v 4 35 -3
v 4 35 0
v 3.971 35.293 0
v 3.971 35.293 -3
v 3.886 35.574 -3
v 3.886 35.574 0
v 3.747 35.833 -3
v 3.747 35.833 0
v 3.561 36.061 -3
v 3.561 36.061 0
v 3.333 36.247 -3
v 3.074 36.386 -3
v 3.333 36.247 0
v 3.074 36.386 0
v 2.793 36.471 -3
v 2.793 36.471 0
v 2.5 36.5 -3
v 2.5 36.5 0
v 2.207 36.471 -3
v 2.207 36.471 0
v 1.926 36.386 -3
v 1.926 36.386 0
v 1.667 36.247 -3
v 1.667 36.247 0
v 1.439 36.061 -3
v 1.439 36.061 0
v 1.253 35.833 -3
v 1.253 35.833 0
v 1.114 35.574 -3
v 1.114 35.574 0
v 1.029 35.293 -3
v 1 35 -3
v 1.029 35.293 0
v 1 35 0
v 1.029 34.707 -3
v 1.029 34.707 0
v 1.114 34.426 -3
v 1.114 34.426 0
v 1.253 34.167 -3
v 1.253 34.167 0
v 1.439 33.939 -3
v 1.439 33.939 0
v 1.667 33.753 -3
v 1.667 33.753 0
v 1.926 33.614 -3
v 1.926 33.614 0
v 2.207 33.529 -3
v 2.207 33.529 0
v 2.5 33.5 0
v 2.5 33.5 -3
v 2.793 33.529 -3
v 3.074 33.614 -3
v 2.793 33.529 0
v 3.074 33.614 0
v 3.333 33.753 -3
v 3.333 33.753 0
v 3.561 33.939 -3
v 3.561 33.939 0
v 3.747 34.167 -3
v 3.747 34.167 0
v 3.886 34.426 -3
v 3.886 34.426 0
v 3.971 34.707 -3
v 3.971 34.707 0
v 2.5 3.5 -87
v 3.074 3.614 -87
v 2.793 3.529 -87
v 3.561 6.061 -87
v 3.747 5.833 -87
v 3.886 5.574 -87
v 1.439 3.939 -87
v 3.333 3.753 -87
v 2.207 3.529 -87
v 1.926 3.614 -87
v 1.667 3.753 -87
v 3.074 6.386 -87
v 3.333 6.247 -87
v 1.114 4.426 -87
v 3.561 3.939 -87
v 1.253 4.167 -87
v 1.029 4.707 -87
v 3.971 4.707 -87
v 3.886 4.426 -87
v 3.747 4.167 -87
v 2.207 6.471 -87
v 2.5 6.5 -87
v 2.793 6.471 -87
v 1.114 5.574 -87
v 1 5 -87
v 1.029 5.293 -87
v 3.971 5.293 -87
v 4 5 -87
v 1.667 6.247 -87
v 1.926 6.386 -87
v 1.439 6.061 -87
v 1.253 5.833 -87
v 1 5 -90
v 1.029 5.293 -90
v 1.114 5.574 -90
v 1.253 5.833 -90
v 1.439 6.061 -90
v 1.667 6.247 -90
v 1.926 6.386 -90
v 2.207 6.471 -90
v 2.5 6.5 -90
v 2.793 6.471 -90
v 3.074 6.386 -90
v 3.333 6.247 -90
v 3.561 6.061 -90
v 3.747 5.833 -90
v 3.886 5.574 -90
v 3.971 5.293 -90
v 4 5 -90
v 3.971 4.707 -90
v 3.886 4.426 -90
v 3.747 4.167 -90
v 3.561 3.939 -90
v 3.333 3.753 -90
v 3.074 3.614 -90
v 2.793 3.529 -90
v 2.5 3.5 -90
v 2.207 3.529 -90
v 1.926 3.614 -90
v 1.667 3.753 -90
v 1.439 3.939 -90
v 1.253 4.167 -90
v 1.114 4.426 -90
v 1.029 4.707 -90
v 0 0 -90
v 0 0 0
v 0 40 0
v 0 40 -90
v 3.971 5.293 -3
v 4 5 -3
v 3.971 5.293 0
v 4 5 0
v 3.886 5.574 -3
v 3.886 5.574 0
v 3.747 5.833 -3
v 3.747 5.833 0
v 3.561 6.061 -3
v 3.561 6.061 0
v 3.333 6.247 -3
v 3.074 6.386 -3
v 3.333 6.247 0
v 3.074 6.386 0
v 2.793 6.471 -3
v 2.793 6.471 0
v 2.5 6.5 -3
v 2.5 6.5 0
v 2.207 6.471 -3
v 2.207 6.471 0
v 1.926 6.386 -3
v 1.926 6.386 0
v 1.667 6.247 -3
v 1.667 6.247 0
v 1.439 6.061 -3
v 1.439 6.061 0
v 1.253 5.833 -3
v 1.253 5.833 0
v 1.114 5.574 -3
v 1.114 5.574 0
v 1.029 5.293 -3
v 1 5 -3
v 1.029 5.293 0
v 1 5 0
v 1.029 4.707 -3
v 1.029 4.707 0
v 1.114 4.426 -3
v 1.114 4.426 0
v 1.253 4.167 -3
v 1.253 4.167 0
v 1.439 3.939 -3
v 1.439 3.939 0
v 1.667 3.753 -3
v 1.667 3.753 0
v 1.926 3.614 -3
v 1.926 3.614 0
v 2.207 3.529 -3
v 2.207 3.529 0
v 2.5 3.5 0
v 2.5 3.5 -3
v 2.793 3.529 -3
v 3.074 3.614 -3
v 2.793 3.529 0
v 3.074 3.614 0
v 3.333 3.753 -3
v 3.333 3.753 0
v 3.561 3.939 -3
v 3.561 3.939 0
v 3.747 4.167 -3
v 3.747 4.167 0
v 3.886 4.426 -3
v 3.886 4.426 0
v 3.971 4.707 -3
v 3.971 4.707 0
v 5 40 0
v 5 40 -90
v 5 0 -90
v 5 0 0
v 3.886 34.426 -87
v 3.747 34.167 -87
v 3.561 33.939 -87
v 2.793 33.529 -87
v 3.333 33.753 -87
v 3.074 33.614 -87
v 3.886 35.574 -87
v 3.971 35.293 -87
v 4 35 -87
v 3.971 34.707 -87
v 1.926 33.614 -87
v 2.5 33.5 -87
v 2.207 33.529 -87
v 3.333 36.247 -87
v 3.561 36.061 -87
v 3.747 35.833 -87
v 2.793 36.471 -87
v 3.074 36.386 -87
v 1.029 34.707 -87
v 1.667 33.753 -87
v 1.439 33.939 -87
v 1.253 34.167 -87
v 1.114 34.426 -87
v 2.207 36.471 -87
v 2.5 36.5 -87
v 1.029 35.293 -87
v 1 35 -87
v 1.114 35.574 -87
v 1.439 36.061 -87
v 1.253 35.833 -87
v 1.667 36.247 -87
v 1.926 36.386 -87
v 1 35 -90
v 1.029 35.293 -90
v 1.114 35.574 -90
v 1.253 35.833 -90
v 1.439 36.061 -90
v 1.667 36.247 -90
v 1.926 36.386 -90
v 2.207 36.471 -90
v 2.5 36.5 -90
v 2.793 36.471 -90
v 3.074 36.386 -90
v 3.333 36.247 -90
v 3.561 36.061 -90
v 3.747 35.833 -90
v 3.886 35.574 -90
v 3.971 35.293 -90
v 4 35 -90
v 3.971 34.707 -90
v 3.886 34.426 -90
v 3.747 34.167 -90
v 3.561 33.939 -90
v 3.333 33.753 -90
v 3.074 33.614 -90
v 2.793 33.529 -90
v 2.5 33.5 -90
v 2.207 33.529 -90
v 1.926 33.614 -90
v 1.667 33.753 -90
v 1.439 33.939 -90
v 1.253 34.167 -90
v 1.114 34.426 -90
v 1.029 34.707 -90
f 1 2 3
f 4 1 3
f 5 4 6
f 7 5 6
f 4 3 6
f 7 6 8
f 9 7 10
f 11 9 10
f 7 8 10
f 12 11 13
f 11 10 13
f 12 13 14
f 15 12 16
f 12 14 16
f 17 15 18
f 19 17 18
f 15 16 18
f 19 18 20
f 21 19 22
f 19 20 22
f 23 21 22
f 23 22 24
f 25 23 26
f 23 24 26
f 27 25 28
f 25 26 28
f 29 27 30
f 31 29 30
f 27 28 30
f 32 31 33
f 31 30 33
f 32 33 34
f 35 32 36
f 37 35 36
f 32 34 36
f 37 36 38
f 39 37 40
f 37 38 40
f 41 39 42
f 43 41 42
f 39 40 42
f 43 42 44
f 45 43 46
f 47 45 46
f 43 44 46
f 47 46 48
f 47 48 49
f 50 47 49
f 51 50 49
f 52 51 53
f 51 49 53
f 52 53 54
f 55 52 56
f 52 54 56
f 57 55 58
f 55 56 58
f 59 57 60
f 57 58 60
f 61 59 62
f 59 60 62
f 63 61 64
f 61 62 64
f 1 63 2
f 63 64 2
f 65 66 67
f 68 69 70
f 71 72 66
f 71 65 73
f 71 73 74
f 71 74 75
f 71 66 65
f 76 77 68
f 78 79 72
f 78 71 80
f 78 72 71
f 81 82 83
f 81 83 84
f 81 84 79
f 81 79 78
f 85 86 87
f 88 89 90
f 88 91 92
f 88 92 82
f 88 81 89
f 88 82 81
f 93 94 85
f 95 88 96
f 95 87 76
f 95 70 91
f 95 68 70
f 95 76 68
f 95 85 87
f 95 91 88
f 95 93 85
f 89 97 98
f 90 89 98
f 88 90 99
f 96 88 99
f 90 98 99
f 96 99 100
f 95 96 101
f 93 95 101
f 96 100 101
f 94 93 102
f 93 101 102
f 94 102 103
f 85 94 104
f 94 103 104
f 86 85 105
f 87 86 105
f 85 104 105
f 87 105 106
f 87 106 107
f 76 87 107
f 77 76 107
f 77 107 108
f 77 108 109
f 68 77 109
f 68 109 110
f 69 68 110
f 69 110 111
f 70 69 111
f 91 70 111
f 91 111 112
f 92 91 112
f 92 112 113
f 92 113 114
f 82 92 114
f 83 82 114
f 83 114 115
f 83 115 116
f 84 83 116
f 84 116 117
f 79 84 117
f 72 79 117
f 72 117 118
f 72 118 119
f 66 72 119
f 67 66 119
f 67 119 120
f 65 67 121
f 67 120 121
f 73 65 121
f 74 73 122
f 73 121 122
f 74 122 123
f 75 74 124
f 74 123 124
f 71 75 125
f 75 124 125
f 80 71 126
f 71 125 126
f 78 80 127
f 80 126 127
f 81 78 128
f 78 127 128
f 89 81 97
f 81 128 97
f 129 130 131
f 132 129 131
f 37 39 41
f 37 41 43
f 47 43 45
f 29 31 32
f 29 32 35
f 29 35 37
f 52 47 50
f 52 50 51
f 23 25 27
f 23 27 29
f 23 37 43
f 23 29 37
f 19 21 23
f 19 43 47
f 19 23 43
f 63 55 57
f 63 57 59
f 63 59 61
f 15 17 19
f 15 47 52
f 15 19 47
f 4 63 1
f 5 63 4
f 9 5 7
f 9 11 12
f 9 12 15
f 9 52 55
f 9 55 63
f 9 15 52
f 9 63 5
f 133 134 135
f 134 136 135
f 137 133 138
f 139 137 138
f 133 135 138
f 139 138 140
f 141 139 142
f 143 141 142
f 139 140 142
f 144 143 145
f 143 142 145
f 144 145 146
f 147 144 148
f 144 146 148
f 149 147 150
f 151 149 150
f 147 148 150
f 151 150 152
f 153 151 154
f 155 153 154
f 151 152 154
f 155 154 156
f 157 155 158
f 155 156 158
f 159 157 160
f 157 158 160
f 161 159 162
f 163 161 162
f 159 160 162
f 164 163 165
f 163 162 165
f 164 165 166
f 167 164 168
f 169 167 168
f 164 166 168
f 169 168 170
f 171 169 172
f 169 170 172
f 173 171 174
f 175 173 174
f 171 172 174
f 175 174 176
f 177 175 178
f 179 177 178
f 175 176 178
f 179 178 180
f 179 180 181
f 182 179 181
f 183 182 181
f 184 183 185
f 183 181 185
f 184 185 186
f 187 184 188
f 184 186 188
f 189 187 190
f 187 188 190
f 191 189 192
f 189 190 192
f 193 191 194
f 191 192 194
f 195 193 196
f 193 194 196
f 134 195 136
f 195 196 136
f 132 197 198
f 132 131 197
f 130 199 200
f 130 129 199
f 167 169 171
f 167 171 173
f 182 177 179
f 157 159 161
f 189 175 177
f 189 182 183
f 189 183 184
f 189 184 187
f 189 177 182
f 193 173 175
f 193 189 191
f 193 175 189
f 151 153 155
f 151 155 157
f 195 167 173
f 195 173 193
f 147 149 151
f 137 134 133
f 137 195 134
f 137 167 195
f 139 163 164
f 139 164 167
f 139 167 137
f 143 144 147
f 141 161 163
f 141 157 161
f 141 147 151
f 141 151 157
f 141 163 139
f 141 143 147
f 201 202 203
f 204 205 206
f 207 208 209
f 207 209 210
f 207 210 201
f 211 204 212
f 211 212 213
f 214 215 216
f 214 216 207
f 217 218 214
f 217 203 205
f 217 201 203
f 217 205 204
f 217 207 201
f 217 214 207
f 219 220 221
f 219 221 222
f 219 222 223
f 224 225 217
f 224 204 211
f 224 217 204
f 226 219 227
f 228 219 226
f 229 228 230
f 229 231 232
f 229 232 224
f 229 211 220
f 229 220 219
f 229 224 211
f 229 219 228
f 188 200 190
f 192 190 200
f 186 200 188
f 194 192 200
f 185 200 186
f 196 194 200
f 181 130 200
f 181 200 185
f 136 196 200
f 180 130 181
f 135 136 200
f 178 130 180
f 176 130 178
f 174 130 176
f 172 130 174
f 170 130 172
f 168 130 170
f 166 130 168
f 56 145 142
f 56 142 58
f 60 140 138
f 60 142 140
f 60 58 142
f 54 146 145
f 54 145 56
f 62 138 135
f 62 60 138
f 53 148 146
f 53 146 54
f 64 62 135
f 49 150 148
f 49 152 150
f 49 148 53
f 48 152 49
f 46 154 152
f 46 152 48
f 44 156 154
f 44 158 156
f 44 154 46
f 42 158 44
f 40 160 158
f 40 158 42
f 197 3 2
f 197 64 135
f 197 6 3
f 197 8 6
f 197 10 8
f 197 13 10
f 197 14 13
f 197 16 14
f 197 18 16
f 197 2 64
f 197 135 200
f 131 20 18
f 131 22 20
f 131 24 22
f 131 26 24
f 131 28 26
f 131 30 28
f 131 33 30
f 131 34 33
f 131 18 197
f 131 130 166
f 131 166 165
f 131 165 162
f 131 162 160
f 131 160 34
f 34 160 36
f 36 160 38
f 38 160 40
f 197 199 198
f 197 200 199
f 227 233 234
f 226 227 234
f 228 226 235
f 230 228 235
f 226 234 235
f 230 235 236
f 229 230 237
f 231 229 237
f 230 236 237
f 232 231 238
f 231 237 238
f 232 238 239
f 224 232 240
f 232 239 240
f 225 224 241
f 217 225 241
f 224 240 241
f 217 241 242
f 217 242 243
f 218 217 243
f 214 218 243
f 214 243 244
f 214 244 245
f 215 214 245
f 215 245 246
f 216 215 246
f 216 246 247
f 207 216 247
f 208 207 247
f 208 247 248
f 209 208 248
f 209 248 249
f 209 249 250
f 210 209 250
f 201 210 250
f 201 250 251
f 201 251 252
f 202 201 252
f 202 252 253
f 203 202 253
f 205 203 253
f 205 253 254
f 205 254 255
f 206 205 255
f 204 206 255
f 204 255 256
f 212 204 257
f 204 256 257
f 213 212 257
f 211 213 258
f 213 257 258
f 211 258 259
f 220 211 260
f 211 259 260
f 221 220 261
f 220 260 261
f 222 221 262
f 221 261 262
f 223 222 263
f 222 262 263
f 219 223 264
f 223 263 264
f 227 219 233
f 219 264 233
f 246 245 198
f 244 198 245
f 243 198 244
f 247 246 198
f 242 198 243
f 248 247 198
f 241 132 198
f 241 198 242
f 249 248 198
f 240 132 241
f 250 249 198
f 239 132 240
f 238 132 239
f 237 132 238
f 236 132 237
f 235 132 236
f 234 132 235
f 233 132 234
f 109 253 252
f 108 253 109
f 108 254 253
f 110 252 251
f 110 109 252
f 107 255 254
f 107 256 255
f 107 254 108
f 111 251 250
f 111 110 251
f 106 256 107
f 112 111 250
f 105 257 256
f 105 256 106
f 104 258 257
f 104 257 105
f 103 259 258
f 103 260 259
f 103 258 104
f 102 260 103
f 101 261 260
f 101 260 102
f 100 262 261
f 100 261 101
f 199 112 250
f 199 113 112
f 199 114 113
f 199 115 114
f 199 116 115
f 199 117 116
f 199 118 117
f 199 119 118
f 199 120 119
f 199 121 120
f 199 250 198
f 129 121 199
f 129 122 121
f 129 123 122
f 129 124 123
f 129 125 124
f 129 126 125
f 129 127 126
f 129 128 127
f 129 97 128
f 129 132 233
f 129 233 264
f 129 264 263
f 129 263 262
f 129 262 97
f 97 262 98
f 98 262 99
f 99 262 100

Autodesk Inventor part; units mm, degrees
ref_plane "YZ Plane" through (0, 0, 0) normal (1, 0, 0) x (0, 1, 0)
ref_plane "XZ Plane" through (0, 0, 0) normal (0, 1, 0) x (-1, 0, 0)
ref_plane "XY Plane" through (0, 0, 0) normal (0, 0, 1) x (1, 0, 0)
sketch "Boceto1" plane through (0, 0, 0) normal (1, 0, 0) x (0, 1, 0)
  line L0 (0, 0) -> (40, 0)
  line L1 (40, 0) -> (40, -90)
  line L2 (40, -90) -> (0, -90)
  line L3 (0, -90) -> (0, 0)
  dimension "d0" = 40
  dimension "d1" = 90
extrude "Extrusión1" add sketch "Boceto1" along normal blind 5
sketch "Boceto2" plane through (0, 0, 0) normal (0, 0, 1) x (1, 0, 0)
  circle A0 centre (2.5, 5) radius 1.5
  circle A1 centre (2.5, 35) radius 1.5
  line L0 (0, 40) -> (0, 0) projected
  line L1 (0, 40) -> (5, 40) projected
  line L2 (0, 0) -> (5, 0) projected
  line L3 (5, 40) -> (5, 0) projected
  point P0 (2.5, 0)
  dimension "d4" = 3
  dimension "d5" = 3
  dimension "d6" = 2.5
  dimension "d7" = 5
  dimension "d8" = 5
  dimension "d9" = 2.5
extrude "Extrusión2" cut sketch "Boceto2" against normal blind 3 contours A0 | A1
sketch "Boceto3" plane through (0, 0, -90) normal (0, 0, -1) x (-1, 0, 0)
  circle A0 centre (-2.5, 5) radius 1.5 projected
  circle A1 centre (-2.5, 5) radius 1.5
  circle A2 centre (-2.5, 35) radius 1.5 projected
  circle A3 centre (-2.5, 35) radius 1.5
  point P0 (0, 0)
extrude "Extrusión3" cut sketch "Boceto3" against normal blind 3
properties part number "Frontal"
